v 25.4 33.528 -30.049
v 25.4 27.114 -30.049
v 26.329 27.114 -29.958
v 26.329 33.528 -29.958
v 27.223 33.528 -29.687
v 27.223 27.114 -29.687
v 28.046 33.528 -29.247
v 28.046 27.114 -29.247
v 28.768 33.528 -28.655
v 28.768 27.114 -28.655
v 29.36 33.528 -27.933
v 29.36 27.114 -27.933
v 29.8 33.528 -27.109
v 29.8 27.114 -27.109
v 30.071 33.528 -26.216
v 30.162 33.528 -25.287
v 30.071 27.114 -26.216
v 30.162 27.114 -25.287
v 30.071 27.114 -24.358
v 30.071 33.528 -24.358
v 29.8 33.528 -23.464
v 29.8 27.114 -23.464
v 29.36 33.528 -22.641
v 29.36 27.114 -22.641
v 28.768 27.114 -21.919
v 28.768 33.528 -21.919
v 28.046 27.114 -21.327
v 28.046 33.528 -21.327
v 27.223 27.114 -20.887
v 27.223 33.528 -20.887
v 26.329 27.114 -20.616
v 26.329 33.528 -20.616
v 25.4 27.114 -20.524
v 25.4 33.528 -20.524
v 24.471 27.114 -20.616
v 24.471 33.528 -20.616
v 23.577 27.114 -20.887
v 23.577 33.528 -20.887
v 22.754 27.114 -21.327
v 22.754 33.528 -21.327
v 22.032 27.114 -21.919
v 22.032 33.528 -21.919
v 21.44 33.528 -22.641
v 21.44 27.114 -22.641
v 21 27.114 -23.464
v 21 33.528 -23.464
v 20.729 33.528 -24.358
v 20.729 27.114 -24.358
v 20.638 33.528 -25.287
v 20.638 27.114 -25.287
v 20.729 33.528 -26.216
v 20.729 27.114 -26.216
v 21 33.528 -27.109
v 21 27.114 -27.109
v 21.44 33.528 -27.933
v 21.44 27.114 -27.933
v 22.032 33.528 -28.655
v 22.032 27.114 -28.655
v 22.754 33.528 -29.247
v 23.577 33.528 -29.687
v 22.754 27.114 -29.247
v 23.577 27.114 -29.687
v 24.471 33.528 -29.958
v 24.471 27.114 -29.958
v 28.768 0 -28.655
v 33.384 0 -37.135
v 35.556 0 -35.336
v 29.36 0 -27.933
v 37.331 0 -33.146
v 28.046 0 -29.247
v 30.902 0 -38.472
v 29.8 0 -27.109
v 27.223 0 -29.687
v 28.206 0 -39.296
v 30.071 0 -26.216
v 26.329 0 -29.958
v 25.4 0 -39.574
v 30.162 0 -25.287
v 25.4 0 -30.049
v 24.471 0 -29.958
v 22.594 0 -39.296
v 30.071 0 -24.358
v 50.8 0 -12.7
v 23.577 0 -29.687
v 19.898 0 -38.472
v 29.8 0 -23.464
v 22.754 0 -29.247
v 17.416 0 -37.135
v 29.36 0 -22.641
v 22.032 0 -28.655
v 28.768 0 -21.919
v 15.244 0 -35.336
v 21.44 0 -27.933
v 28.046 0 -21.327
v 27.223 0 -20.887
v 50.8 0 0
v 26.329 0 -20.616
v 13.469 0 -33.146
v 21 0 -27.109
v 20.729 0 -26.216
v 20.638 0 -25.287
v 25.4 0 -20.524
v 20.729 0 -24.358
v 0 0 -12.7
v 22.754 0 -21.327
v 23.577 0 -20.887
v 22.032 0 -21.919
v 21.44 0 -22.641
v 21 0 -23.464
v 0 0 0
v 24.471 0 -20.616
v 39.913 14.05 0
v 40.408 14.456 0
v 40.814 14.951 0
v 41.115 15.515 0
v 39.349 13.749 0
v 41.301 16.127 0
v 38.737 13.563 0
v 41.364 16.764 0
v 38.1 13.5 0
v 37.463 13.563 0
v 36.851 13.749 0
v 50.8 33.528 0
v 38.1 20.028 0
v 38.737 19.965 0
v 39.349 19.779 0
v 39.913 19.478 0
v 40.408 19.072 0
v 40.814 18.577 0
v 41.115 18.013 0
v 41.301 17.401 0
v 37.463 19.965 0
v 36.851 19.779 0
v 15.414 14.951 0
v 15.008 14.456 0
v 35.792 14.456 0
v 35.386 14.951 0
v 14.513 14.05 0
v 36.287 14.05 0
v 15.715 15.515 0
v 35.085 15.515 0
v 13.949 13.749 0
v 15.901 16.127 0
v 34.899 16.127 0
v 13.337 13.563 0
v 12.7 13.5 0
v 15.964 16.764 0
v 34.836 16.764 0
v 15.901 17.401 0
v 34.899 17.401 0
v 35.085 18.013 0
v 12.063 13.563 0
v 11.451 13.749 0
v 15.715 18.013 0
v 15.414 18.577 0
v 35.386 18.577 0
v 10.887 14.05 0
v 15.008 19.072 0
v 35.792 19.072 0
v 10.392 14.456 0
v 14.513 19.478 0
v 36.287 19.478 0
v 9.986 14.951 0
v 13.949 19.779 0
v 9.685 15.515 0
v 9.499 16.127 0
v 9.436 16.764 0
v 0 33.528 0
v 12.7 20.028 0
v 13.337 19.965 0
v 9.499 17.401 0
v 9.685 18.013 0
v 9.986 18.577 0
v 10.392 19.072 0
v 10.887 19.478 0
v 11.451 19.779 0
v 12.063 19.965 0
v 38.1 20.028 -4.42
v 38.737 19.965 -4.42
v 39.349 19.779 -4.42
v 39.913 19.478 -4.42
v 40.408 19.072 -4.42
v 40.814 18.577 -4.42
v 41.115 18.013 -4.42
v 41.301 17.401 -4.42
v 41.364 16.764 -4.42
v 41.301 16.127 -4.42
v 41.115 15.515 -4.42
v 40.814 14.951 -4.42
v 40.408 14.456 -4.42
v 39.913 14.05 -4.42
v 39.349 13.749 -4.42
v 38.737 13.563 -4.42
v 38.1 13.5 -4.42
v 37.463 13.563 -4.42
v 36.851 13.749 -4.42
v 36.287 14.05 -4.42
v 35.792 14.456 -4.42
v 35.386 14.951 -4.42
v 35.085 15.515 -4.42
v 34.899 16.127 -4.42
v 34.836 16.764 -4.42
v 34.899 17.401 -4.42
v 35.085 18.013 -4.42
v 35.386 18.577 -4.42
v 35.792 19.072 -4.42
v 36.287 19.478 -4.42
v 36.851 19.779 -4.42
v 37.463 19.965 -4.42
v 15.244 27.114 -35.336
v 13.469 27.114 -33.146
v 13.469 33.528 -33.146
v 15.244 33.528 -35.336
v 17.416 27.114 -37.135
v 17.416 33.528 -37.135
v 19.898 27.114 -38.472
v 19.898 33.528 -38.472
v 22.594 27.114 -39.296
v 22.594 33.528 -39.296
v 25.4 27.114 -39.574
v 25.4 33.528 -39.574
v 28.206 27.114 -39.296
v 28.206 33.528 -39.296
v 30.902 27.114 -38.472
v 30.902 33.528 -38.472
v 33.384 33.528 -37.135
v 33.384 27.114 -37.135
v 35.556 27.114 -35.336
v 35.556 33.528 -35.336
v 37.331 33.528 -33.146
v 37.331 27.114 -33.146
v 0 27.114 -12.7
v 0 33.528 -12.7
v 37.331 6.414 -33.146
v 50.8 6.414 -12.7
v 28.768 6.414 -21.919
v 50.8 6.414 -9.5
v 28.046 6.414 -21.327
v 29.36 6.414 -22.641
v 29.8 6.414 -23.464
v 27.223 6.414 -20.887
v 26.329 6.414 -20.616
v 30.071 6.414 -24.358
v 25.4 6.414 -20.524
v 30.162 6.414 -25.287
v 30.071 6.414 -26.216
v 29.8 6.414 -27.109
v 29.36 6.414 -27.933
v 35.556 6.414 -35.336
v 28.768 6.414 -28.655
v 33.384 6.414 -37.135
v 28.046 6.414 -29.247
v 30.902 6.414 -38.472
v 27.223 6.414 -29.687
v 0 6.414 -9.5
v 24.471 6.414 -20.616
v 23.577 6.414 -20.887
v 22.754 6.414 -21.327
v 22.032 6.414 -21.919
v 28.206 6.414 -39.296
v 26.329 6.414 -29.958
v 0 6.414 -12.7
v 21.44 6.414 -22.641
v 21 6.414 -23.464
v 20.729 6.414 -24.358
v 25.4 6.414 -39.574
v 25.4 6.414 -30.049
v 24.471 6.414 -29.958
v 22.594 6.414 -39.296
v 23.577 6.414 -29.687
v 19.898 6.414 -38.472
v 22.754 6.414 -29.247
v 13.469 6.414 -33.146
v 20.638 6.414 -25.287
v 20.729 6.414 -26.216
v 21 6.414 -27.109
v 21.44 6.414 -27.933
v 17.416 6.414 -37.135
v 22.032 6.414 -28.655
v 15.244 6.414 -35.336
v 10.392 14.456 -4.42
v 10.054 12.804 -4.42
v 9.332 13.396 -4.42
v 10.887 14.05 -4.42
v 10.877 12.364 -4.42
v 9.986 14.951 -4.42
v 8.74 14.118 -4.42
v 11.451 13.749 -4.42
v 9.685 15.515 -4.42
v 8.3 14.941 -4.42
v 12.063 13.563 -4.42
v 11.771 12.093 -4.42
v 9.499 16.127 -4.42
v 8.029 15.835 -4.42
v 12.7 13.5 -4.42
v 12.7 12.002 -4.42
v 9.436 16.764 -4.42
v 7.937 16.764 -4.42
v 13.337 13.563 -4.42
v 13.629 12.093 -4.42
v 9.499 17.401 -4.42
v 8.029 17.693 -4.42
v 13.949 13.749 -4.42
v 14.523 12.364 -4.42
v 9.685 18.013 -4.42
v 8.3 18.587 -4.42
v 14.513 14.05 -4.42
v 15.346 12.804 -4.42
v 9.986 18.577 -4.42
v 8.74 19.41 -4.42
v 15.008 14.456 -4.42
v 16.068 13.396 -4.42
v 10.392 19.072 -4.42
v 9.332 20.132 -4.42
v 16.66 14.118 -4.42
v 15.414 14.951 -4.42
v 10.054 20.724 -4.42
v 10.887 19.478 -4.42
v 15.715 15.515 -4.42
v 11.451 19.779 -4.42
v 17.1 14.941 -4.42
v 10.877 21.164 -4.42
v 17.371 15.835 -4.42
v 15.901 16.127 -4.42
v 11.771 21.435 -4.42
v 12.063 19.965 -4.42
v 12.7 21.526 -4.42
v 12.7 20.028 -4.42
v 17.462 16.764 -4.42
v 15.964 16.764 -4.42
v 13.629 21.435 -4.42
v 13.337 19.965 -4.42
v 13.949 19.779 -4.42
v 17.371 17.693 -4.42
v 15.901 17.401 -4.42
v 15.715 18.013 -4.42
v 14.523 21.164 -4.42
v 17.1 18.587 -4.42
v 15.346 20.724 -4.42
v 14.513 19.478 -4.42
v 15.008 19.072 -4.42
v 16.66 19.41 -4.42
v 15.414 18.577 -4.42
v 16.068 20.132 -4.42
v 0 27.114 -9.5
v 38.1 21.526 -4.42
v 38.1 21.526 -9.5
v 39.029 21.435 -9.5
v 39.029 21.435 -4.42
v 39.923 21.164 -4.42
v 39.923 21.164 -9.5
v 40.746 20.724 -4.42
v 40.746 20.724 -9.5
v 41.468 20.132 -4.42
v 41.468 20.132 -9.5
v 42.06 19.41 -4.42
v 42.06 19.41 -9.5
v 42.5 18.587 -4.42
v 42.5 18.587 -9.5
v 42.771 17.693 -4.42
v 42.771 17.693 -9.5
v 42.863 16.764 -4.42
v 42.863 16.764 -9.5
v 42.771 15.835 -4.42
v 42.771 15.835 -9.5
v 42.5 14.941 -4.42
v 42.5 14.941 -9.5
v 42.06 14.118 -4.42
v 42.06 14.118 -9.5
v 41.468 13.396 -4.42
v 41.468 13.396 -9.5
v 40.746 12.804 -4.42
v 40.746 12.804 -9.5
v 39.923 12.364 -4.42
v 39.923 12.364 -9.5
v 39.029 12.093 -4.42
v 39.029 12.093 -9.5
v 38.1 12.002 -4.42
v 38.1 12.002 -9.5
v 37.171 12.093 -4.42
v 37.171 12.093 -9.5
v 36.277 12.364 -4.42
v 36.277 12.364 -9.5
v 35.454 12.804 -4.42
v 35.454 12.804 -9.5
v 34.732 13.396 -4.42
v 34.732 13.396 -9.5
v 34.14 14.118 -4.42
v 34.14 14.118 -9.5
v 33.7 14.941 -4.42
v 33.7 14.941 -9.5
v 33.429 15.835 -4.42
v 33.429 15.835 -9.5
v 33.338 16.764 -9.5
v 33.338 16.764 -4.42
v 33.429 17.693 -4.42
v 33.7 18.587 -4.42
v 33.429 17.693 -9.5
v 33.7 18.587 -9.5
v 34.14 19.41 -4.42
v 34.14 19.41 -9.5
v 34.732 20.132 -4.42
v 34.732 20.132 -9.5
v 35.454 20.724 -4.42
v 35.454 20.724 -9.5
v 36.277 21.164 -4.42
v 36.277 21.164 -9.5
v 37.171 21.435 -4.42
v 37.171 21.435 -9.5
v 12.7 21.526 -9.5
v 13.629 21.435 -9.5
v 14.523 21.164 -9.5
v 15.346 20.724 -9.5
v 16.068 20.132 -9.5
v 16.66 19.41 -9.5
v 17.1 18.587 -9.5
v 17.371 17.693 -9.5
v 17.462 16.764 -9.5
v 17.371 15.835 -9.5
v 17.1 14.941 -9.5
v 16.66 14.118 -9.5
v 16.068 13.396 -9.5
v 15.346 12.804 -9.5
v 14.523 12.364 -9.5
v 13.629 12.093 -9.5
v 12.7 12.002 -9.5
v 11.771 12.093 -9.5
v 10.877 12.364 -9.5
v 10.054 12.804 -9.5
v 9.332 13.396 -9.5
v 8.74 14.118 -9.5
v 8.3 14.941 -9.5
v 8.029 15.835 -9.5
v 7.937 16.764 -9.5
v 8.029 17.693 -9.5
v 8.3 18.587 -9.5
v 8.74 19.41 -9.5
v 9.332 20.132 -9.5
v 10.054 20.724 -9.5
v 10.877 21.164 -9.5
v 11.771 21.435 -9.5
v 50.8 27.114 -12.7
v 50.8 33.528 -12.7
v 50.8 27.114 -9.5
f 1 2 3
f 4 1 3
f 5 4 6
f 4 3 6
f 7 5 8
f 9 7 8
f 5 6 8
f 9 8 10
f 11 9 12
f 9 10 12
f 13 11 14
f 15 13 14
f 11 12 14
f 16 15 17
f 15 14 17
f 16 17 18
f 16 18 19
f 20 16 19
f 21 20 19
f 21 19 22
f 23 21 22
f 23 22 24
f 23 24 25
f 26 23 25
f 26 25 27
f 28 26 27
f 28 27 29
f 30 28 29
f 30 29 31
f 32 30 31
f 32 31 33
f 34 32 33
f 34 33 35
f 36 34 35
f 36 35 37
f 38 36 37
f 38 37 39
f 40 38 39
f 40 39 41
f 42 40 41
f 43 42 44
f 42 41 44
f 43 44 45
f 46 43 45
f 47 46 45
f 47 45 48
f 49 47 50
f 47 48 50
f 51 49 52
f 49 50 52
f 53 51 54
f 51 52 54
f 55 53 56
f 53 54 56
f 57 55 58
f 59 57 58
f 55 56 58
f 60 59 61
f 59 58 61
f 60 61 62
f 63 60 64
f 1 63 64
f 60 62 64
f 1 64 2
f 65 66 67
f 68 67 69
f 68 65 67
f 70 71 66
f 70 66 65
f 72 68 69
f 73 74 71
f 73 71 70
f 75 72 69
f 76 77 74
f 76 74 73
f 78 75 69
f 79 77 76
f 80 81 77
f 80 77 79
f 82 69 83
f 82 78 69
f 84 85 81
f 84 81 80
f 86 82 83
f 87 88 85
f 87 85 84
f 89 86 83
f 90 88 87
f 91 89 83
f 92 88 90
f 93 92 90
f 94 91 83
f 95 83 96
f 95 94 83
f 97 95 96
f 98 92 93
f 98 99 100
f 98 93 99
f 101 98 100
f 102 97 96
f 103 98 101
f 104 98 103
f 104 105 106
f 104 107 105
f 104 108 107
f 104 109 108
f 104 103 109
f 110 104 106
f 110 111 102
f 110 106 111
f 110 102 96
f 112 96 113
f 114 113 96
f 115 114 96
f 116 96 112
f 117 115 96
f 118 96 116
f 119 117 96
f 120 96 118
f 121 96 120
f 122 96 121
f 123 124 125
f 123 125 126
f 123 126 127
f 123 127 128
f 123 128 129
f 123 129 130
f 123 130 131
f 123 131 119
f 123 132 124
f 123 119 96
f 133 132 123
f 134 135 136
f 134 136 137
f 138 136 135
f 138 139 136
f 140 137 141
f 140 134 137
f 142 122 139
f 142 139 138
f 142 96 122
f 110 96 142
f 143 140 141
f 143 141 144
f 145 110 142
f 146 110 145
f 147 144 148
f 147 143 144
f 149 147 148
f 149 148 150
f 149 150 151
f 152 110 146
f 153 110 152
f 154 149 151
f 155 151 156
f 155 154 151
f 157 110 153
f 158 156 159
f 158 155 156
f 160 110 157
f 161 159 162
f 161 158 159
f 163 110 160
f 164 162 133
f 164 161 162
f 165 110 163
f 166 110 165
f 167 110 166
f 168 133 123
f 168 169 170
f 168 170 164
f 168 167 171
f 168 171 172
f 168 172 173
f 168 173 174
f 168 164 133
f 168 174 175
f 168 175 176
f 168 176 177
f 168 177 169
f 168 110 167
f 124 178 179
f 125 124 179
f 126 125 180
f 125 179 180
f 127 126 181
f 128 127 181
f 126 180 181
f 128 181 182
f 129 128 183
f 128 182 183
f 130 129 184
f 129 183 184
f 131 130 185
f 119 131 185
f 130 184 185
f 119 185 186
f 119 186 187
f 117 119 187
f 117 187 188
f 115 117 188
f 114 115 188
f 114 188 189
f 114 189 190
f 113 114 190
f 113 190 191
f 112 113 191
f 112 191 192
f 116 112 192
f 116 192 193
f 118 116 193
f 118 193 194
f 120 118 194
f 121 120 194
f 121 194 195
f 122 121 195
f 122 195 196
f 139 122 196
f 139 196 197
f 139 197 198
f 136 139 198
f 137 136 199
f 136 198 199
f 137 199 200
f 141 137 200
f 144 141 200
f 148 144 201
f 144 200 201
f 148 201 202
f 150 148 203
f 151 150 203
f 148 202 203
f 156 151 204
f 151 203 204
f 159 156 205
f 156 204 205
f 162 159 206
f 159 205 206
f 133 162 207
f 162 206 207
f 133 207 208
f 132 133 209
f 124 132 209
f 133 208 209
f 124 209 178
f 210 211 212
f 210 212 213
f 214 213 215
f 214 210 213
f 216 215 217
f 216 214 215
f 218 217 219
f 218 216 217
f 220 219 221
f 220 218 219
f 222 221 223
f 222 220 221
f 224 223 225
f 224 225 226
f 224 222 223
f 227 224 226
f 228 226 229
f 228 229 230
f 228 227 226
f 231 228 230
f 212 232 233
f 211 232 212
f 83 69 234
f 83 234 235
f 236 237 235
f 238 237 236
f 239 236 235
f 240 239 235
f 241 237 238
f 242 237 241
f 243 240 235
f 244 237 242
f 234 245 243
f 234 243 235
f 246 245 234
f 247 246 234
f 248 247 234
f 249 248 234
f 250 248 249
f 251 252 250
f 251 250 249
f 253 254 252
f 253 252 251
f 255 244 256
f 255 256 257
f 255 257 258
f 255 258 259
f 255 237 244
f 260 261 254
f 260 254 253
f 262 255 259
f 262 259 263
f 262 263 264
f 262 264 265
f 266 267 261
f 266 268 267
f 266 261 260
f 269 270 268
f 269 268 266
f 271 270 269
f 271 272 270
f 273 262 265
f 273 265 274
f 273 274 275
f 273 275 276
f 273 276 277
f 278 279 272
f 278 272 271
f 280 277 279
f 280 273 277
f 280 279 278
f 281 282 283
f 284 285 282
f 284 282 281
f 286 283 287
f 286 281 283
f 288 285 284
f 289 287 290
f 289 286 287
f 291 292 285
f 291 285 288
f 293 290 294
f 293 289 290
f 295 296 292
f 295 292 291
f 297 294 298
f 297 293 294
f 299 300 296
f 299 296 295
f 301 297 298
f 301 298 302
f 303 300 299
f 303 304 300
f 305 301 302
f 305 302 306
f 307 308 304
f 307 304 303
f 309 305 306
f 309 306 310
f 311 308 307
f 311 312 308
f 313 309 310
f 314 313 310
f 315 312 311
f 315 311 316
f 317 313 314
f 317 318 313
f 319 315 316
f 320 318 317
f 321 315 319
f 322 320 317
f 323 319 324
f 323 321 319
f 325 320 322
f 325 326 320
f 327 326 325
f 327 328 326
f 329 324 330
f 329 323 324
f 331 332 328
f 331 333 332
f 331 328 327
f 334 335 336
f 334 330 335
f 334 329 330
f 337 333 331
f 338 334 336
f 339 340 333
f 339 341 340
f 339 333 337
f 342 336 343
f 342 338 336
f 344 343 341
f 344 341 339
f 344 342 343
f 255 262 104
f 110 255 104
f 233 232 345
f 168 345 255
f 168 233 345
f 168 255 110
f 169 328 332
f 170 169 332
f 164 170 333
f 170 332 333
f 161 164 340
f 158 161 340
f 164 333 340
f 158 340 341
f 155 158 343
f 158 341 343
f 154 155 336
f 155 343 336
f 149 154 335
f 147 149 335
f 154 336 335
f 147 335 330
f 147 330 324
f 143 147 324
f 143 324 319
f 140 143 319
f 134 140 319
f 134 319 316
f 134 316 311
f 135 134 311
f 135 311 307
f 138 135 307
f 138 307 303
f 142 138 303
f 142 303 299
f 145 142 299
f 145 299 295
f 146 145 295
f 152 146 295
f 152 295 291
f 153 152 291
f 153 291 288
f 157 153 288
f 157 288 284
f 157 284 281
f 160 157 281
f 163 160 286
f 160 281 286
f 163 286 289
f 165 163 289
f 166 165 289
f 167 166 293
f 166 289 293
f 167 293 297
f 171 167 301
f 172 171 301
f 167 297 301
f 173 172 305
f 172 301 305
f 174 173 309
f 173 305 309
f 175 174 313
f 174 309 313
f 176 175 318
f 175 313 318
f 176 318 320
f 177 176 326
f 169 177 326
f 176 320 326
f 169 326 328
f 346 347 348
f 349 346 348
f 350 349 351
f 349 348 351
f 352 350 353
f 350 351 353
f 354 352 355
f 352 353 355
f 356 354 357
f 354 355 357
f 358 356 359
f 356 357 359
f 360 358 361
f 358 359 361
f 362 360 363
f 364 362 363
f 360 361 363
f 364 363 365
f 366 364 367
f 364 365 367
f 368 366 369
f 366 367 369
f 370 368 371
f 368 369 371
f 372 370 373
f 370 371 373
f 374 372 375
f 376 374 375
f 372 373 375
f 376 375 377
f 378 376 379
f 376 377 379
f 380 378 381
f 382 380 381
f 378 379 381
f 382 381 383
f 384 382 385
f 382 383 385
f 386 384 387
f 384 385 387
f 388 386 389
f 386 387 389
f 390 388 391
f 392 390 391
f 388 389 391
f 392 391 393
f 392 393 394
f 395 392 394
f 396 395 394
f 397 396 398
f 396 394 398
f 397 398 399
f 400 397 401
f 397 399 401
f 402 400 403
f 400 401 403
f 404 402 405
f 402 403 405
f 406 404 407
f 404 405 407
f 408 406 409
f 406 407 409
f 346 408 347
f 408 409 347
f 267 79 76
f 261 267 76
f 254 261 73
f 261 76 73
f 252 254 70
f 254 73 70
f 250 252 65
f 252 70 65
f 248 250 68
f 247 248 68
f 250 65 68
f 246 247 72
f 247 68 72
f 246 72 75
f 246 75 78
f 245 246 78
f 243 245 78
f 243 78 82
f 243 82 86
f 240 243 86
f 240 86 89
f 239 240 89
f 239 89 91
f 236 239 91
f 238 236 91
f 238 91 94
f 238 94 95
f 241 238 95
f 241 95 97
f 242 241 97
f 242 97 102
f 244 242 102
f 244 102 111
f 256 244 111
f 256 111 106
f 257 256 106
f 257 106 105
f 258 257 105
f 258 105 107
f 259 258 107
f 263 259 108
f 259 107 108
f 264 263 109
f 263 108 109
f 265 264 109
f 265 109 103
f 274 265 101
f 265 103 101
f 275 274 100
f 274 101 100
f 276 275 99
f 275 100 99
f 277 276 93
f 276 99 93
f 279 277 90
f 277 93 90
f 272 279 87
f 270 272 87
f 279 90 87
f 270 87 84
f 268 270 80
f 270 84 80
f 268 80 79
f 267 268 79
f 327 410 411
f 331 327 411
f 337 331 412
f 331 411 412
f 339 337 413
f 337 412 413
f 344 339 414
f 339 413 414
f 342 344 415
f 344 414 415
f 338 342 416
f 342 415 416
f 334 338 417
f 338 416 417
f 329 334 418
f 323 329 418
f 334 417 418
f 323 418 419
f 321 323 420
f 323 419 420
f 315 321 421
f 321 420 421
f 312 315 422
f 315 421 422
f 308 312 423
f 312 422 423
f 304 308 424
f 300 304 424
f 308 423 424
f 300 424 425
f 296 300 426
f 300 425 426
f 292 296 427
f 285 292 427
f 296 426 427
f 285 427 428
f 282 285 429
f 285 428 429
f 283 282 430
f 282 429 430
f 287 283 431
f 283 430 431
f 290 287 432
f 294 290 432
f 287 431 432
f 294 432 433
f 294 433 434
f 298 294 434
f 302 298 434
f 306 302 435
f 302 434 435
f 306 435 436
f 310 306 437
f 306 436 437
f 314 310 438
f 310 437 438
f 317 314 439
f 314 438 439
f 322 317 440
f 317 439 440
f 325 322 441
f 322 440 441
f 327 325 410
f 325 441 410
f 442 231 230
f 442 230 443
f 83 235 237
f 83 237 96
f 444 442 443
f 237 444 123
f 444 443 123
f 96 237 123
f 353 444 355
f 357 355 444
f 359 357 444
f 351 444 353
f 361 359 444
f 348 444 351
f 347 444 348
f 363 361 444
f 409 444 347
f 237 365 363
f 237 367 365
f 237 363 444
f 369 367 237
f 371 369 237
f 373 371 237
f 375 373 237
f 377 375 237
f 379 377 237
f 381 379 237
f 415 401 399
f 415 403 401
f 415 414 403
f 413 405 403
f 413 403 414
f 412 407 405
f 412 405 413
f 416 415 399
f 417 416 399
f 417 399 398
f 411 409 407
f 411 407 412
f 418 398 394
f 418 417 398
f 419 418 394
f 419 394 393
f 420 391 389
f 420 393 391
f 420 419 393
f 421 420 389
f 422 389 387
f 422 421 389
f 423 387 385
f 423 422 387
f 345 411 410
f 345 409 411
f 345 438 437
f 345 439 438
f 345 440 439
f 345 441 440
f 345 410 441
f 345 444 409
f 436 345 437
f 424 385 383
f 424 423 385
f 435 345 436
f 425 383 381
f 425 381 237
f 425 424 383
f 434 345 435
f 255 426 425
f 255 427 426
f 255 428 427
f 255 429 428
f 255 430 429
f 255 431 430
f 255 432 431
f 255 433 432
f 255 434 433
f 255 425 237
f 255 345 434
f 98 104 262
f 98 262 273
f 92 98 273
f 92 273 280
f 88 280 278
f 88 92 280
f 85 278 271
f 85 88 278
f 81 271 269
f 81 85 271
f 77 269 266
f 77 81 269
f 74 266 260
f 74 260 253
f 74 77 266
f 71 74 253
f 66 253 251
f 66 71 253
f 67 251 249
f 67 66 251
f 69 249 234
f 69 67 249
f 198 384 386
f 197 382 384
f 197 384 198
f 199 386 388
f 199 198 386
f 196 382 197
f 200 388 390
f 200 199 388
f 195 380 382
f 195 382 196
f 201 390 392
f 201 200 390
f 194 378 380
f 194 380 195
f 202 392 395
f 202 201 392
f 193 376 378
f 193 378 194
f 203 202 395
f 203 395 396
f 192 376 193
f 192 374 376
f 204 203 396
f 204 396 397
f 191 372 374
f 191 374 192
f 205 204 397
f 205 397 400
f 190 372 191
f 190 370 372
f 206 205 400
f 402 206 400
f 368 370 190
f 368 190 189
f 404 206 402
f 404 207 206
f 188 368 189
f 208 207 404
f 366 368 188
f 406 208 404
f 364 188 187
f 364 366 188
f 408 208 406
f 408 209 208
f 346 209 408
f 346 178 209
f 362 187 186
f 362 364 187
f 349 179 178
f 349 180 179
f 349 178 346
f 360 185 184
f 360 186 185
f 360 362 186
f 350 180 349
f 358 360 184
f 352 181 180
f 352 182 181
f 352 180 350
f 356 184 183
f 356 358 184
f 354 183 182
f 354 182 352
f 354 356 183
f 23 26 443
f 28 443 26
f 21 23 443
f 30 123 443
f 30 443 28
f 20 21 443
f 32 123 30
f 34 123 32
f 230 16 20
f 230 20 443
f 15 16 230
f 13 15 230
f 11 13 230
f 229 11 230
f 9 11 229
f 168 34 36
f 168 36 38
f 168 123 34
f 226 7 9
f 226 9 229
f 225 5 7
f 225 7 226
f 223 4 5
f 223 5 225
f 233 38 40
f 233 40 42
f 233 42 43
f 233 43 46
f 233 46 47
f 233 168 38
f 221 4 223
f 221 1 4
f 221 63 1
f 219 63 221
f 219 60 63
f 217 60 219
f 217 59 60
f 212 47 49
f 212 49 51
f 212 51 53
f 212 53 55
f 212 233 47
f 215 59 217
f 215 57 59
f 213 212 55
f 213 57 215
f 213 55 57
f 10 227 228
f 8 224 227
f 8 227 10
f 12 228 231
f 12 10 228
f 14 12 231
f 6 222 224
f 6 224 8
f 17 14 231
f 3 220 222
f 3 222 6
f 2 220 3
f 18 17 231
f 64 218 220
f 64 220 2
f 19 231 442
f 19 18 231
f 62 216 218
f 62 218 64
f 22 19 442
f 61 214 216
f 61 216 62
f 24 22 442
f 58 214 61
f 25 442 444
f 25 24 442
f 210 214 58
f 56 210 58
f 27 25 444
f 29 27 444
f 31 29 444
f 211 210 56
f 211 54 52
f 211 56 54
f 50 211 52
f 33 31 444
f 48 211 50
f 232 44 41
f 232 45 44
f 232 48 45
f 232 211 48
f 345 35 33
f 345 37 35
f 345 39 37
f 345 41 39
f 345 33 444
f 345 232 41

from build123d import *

# Parameters (mm, degrees)
BOSS_EXTRUDE1_DEPTH         = 50.8
SKETCH2_R                   = 3.2639
F_1_4_CLEARNACE_HOLES_DEPTH = 9.4996
CUT_EXTRUDE2_REACH          = 75.836
SKETCH3_R                   = 4.7625
SKETCH4_R                   = 4.7625
F_3_8_HEAD_DEPTH            = 5.08


with BuildPart() as part:
    # Sketch1 → Boss-Extrude1 (new body)
    with BuildSketch(Plane(origin=(0, 0, 0), x_dir=(0, 0, -1), z_dir=(1, 0, 0))):
        Polygon((41.796907359, 27.1145), (9.4996, 27.1145), (9.4996, 6.4135), (41.796907359, 6.4135), (41.796907359, 0), (0, 0), (0, 33.528), (41.796907359, 33.528), align=None)
    extrude(amount=BOSS_EXTRUDE1_DEPTH)

    # Sketch2 → 1/4 Clearnace Holes (cut)
    with BuildSketch(Plane(origin=(0, 0, -9.4996), x_dir=(-1, 0, 0), z_dir=(0, 0, -1))):
        with Locations(Location((-38.1, 16.764, 0), (0, 0, 90))):
            Circle(SKETCH2_R)
        with Locations(Location((-12.7, 16.764, 0), (0, 0, 90))):
            Circle(SKETCH2_R)
    extrude(amount=-F_1_4_CLEARNACE_HOLES_DEPTH, mode=Mode.SUBTRACT)

    # Cut-Extrude2: up to this face of the body (flat: up to its plane)
    cut_extrude2_end = Plane(part.part.faces().sort_by_distance((25.4, 33.528, -20.898453679))[0])
    # Sketch3 → Cut-Extrude2 (cut, up to the picked face)
    with BuildSketch(Plane.XZ, mode=Mode.PRIVATE) as cut_extrude2_sk1:
        with Locations(Location((25.4, -25.286907359, 0), (0, 0, 270))):
            Circle(SKETCH3_R)
    cut_extrude2_tool1 = split(extrude(cut_extrude2_sk1.sketch, amount=-CUT_EXTRUDE2_REACH, mode=Mode.PRIVATE), bisect_by=cut_extrude2_end, keep=Keep.BOTH, mode=Mode.PRIVATE)
    # Sketch3 → Cut-Extrude2 (cut, up to the picked face)
    with BuildSketch(Plane.XZ, mode=Mode.PRIVATE) as cut_extrude2_sk2:
        with BuildLine():
            Line((0, -12.7), (13.468510474, -33.146437494))
            ThreePointArc((13.468510474, -33.146437494), (25.4, -39.574407359), (37.331489526, -33.146437494))
            Line((37.331489526, -33.146437494), (50.8, -12.7))
            Line((50.8, -12.7), (50.8, -41.796907359))
            Line((50.8, -41.796907359), (0, -41.796907359))
            Line((0, -41.796907359), (0, -12.7))
        make_face()
    cut_extrude2_tool2 = split(extrude(cut_extrude2_sk2.sketch, amount=-CUT_EXTRUDE2_REACH, mode=Mode.PRIVATE), bisect_by=cut_extrude2_end, keep=Keep.BOTH, mode=Mode.PRIVATE)
    add(cut_extrude2_tool1.solids().sort_by(Axis((25.4, 0, -25.286907), (0, 1, 0)))[0], mode=Mode.SUBTRACT)
    add(cut_extrude2_tool2.solids().sort_by(Axis((6.245364, 0, -23.245262), (0, 1, 0)))[0], mode=Mode.SUBTRACT)

    # Sketch4 → 3/8 Head (cut)
    with BuildSketch(Plane(origin=(0, 0, -9.4996), x_dir=(-1, 0, 0), z_dir=(0, 0, -1))):
        with Locations(Location((-12.7, 16.764, 0), (0, 0, 90))):
            Circle(SKETCH4_R)
        with Locations(Location((-38.1, 16.764, 0), (0, 0, 90))):
            Circle(SKETCH4_R)
    extrude(amount=-F_3_8_HEAD_DEPTH, mode=Mode.SUBTRACT)


solid = part.part
